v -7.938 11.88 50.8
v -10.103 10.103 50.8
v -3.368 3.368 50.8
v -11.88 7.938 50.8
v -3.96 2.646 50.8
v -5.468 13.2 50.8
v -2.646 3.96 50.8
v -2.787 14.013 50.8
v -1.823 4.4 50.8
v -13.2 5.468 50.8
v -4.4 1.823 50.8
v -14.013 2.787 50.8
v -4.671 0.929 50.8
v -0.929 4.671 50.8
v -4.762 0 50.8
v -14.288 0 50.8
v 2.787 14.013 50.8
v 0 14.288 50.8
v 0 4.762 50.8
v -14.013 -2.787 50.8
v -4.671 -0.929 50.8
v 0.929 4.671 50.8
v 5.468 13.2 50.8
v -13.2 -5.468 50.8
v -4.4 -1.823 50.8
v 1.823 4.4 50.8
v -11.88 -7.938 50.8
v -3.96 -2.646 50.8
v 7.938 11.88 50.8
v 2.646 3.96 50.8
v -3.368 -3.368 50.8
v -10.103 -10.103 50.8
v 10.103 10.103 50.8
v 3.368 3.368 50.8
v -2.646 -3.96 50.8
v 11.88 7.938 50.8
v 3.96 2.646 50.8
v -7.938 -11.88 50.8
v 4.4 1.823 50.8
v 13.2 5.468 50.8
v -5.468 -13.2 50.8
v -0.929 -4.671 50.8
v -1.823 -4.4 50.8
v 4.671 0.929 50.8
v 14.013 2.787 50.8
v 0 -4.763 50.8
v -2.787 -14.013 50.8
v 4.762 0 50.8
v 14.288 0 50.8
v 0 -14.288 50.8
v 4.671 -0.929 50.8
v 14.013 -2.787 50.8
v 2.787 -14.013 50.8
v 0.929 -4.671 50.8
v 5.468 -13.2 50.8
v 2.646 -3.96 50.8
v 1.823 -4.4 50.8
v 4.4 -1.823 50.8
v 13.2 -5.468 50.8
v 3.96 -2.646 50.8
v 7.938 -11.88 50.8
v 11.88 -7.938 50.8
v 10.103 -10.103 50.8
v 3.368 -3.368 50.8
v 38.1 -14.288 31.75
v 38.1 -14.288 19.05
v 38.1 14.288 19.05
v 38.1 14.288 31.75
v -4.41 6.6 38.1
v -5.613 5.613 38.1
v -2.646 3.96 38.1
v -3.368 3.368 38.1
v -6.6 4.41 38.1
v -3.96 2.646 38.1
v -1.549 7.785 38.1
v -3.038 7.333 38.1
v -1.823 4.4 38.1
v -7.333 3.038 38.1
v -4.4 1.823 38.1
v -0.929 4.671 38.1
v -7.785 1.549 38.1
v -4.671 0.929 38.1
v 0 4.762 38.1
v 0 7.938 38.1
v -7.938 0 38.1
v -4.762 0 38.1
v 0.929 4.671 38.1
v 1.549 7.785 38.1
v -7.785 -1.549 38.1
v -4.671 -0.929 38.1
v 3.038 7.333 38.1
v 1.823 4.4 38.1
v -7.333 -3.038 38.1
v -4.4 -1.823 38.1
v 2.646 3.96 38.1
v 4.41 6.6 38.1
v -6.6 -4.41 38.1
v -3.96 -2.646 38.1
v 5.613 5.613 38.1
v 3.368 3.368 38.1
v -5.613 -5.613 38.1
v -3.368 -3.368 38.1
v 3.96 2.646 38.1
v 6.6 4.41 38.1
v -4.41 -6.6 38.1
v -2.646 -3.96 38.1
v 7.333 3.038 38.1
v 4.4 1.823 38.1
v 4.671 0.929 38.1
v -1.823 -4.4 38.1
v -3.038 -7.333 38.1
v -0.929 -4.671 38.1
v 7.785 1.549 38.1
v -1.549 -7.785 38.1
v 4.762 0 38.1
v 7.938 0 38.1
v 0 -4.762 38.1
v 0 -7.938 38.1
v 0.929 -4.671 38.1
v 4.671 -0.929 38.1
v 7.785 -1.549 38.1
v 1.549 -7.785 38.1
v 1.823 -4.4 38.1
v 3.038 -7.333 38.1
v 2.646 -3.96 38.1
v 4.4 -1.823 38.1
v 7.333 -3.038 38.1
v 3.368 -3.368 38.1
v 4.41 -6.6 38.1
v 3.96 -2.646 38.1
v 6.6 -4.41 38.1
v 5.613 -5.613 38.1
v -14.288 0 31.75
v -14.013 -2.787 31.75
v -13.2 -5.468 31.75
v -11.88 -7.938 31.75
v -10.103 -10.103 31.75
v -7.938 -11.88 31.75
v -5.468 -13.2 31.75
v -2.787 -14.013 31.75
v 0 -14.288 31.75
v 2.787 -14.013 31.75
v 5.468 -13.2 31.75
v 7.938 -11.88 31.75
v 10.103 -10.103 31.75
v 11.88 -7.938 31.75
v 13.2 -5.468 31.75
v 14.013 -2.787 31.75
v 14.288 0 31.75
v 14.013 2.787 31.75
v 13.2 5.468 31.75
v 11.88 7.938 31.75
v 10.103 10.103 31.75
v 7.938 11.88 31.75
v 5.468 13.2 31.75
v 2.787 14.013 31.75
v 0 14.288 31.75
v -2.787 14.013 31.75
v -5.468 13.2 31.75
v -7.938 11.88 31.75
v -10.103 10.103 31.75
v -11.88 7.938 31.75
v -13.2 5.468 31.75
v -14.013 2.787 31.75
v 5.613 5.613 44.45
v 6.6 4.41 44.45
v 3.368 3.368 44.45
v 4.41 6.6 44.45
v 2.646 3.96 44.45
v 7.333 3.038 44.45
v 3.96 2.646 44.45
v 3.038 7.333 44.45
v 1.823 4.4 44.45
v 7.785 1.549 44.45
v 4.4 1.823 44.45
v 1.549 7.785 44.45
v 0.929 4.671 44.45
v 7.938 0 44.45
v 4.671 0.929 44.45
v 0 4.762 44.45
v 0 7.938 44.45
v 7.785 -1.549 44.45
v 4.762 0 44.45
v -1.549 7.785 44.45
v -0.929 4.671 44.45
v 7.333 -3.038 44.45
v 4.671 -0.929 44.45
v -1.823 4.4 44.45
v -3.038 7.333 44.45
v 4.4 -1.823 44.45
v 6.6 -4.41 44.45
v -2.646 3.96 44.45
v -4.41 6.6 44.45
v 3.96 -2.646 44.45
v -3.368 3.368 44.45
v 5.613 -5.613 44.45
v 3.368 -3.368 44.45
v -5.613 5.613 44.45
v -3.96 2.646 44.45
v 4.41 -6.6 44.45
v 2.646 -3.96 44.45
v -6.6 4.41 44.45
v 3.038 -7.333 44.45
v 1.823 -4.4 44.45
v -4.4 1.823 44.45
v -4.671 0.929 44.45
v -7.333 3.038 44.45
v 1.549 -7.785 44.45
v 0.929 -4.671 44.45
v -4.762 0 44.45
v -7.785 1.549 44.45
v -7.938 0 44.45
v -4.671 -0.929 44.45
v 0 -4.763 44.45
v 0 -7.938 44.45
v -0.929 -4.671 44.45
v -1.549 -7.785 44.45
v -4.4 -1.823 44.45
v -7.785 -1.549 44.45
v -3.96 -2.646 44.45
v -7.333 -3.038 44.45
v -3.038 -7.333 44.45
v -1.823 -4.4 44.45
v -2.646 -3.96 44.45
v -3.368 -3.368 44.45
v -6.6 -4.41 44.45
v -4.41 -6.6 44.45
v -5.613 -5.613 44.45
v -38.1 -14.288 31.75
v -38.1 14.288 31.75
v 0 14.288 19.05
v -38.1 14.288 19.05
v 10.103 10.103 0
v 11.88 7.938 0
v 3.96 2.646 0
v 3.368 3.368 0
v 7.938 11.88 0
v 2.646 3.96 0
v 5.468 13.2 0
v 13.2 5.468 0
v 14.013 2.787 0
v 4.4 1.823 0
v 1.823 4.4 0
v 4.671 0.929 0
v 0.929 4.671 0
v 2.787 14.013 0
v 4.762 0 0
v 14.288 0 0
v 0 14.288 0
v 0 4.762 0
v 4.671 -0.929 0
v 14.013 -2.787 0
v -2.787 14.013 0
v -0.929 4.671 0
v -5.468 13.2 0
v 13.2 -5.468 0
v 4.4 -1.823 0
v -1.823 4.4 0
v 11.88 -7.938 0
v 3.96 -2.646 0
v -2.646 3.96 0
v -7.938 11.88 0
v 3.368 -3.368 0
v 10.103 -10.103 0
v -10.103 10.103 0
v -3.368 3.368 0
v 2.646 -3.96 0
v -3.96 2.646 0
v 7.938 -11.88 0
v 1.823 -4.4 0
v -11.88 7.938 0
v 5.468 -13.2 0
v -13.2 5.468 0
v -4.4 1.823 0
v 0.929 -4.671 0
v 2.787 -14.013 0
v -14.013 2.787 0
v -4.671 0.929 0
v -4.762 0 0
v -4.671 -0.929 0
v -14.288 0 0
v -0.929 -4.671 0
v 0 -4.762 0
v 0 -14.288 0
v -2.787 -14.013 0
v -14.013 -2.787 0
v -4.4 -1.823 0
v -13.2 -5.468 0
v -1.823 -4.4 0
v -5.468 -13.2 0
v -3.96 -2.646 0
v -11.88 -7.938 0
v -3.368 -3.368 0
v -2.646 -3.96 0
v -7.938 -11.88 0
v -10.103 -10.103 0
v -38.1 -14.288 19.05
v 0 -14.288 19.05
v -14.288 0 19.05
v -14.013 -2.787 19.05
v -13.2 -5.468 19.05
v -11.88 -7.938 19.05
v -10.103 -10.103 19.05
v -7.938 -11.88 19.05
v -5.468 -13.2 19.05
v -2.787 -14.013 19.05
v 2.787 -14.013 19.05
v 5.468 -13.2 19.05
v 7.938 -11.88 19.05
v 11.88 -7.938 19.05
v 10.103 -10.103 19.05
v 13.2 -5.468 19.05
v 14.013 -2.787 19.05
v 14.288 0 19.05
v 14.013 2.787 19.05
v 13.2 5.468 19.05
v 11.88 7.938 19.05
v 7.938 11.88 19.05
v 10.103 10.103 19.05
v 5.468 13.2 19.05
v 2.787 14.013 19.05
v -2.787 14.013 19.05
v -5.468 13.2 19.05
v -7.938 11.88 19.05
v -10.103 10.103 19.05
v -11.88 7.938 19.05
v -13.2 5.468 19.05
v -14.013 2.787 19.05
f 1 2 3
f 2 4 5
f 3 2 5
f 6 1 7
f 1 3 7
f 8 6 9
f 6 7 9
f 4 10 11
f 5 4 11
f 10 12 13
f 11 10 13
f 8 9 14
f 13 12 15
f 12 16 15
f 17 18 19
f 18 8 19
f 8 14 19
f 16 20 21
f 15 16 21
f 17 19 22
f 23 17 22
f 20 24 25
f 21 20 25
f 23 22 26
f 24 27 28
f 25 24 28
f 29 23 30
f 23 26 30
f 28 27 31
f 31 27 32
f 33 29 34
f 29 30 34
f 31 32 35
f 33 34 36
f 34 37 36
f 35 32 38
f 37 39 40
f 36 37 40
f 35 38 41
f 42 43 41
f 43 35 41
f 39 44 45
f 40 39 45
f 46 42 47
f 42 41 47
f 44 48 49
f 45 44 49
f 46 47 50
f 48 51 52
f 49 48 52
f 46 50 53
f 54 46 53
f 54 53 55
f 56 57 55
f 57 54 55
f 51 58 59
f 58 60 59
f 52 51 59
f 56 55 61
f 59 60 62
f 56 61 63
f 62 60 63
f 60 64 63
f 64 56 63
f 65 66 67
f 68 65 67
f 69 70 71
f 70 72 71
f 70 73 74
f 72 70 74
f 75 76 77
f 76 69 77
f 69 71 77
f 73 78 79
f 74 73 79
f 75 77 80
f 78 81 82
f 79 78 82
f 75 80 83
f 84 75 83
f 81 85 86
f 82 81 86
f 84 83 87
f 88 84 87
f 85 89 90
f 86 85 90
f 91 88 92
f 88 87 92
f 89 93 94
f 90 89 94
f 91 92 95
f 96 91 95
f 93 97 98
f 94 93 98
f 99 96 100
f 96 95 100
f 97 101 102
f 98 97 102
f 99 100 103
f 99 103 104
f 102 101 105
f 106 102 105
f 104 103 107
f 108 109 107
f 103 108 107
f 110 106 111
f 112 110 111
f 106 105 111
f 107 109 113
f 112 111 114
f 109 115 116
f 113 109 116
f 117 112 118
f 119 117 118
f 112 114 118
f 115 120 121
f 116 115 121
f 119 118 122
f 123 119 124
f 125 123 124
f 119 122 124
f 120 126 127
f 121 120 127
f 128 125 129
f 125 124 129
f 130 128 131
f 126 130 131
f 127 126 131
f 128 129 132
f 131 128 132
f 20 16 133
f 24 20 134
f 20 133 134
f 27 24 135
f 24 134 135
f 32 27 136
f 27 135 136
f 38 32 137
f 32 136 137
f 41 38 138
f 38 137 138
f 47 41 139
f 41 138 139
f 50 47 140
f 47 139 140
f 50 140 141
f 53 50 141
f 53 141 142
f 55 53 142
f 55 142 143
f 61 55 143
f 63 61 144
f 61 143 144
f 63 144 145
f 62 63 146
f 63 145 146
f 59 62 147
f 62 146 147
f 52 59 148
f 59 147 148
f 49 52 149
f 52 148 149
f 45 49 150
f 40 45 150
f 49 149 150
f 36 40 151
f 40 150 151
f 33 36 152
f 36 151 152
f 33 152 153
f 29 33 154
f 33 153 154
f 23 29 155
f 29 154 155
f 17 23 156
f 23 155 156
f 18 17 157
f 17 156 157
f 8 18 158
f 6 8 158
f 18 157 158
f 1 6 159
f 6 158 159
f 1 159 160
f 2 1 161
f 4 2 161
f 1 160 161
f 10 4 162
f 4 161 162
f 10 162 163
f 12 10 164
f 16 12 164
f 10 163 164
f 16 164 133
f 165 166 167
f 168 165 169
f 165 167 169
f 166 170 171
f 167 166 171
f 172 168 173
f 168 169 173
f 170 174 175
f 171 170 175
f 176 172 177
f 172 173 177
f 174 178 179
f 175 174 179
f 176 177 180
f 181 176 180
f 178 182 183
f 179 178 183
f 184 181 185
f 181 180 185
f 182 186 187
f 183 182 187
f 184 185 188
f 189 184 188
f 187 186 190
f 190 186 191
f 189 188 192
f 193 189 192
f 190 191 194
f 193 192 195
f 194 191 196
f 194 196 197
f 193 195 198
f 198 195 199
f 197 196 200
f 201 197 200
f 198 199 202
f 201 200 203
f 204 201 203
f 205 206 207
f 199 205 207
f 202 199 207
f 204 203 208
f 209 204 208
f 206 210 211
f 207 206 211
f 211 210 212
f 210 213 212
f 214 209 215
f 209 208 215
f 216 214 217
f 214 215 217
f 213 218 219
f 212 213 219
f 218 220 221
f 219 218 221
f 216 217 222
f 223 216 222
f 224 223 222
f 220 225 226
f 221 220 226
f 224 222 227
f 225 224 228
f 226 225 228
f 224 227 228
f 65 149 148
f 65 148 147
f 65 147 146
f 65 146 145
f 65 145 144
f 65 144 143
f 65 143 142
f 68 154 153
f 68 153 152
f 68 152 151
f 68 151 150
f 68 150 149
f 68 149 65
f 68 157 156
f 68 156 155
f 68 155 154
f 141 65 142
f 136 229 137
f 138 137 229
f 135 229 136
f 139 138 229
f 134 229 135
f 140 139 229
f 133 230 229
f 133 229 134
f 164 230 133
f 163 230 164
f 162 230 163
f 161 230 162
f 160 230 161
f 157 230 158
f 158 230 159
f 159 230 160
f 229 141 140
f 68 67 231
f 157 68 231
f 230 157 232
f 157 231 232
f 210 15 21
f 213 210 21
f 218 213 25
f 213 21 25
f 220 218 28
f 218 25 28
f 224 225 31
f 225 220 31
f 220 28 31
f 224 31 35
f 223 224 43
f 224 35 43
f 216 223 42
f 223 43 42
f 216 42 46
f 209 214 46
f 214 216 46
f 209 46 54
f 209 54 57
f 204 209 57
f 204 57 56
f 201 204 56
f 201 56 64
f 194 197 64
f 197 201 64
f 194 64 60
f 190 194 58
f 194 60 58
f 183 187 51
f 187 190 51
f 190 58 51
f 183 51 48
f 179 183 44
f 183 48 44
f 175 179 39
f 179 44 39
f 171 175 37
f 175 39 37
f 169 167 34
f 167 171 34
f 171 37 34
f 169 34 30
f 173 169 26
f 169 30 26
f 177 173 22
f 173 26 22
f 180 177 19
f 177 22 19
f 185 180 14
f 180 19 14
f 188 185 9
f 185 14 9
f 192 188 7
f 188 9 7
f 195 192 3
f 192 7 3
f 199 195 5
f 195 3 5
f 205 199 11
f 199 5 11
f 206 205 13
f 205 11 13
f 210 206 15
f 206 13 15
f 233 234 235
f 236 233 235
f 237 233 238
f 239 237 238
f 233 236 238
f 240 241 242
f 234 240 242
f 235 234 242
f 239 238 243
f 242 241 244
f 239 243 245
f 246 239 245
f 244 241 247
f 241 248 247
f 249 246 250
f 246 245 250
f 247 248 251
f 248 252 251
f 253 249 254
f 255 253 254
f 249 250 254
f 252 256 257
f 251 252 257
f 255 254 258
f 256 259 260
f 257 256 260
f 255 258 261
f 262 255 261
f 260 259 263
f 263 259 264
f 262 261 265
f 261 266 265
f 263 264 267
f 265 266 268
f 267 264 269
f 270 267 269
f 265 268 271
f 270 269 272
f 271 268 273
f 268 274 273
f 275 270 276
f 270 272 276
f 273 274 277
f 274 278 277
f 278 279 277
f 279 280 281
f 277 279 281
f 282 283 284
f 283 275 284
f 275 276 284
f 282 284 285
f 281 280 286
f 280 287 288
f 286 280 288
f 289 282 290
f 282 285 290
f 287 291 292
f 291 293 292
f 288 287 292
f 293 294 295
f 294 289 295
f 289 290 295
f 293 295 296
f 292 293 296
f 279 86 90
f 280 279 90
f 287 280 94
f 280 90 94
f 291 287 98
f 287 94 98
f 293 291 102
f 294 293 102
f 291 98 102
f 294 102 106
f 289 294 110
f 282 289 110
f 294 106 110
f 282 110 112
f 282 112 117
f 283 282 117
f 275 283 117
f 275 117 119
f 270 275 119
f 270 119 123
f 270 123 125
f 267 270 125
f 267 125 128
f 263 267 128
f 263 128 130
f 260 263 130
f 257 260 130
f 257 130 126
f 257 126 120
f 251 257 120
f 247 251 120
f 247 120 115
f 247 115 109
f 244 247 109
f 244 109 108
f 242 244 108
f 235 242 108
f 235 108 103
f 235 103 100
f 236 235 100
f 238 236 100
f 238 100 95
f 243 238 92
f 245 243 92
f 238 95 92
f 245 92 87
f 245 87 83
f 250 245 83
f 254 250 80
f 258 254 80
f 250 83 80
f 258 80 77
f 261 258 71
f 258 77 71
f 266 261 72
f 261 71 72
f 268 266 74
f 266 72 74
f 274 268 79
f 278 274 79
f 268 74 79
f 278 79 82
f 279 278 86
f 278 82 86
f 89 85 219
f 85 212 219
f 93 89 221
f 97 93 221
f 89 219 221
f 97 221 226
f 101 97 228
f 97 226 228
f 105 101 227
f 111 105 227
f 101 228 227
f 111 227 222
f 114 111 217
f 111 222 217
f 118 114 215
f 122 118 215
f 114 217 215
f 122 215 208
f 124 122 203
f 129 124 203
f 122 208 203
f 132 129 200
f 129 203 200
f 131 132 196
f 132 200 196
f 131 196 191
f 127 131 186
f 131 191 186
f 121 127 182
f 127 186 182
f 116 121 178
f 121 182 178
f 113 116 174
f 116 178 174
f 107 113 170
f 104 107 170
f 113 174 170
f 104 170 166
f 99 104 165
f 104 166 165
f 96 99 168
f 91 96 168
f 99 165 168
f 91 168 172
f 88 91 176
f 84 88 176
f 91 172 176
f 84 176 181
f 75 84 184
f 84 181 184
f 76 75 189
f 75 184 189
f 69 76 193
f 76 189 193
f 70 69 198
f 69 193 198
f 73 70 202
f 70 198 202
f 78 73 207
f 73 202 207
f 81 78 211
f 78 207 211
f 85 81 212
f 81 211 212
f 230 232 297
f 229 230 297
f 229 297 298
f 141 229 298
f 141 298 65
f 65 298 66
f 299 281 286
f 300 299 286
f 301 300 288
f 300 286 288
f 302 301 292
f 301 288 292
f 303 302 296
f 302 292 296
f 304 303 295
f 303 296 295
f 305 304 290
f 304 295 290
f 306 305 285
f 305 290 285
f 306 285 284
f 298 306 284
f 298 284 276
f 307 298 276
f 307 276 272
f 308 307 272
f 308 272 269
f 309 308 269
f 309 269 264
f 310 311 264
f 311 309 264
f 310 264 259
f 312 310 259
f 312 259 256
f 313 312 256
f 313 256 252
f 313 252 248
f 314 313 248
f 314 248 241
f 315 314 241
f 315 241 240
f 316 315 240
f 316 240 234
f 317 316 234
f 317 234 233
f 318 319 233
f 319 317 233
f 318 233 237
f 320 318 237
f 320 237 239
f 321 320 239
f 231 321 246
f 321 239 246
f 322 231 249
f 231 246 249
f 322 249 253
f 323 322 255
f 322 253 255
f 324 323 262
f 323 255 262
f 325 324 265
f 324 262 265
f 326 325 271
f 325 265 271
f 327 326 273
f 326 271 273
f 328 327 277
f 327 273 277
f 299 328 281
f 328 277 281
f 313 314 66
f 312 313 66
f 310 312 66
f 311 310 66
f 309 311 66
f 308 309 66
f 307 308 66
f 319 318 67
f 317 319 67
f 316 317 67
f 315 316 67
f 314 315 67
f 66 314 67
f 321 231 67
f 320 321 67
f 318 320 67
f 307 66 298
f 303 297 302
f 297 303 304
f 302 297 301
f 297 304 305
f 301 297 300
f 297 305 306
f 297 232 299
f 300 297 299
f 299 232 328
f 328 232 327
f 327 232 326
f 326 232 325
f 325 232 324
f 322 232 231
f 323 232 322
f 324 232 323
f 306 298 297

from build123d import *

# Parameters (mm, degrees)
F4_DEPTH = 12.7
F5_R     = 4.7625
F6_DEPTH = 50.801


with BuildPart() as f1:
    # F0 (on Front) → F1 (revolve)
    with BuildSketch(Plane.XZ):
        Polygon((-4.7625, 44.45), (-4.7625, 50.8), (-14.2875, 50.8), (-14.2875, 0), (-4.7625, 0), (-4.7625, 38.1), (-7.9375, 38.1), (-7.9375, 44.45), align=None)
    revolve(axis=Axis((0, 0, 5.547127), (0, 0, 1)))

    # F3 (on offset) → F4 (join)
    with BuildSketch(Plane.XY.offset(19.05)):
        with BuildLine():
            Line((0, 14.2875), (-38.1, 14.2875))
            Line((-38.1, 14.2875), (-38.1, -14.2875))
            Line((-38.1, -14.2875), (0, -14.2875))
            ThreePointArc((0, -14.2875), (-14.2875, 0), (0, 14.2875))
        make_face()
        with BuildLine():
            Line((38.1, 14.2875), (0, 14.2875))
            ThreePointArc((0, 14.2875), (10.102788, 10.102788), (14.2875, 0))
            ThreePointArc((14.2875, 0), (10.102788, -10.102788), (0, -14.2875))
            Line((0, -14.2875), (38.1, -14.2875))
            Line((38.1, -14.2875), (38.1, 14.2875))
        make_face()
    extrude(amount=F4_DEPTH)

    # F5 (on face) → F6 (cut, through all)
    with BuildSketch(Plane.XY.offset(50.8)):
        Circle(F5_R)
    extrude(amount=-F6_DEPTH, mode=Mode.SUBTRACT)


solid = f1.part
